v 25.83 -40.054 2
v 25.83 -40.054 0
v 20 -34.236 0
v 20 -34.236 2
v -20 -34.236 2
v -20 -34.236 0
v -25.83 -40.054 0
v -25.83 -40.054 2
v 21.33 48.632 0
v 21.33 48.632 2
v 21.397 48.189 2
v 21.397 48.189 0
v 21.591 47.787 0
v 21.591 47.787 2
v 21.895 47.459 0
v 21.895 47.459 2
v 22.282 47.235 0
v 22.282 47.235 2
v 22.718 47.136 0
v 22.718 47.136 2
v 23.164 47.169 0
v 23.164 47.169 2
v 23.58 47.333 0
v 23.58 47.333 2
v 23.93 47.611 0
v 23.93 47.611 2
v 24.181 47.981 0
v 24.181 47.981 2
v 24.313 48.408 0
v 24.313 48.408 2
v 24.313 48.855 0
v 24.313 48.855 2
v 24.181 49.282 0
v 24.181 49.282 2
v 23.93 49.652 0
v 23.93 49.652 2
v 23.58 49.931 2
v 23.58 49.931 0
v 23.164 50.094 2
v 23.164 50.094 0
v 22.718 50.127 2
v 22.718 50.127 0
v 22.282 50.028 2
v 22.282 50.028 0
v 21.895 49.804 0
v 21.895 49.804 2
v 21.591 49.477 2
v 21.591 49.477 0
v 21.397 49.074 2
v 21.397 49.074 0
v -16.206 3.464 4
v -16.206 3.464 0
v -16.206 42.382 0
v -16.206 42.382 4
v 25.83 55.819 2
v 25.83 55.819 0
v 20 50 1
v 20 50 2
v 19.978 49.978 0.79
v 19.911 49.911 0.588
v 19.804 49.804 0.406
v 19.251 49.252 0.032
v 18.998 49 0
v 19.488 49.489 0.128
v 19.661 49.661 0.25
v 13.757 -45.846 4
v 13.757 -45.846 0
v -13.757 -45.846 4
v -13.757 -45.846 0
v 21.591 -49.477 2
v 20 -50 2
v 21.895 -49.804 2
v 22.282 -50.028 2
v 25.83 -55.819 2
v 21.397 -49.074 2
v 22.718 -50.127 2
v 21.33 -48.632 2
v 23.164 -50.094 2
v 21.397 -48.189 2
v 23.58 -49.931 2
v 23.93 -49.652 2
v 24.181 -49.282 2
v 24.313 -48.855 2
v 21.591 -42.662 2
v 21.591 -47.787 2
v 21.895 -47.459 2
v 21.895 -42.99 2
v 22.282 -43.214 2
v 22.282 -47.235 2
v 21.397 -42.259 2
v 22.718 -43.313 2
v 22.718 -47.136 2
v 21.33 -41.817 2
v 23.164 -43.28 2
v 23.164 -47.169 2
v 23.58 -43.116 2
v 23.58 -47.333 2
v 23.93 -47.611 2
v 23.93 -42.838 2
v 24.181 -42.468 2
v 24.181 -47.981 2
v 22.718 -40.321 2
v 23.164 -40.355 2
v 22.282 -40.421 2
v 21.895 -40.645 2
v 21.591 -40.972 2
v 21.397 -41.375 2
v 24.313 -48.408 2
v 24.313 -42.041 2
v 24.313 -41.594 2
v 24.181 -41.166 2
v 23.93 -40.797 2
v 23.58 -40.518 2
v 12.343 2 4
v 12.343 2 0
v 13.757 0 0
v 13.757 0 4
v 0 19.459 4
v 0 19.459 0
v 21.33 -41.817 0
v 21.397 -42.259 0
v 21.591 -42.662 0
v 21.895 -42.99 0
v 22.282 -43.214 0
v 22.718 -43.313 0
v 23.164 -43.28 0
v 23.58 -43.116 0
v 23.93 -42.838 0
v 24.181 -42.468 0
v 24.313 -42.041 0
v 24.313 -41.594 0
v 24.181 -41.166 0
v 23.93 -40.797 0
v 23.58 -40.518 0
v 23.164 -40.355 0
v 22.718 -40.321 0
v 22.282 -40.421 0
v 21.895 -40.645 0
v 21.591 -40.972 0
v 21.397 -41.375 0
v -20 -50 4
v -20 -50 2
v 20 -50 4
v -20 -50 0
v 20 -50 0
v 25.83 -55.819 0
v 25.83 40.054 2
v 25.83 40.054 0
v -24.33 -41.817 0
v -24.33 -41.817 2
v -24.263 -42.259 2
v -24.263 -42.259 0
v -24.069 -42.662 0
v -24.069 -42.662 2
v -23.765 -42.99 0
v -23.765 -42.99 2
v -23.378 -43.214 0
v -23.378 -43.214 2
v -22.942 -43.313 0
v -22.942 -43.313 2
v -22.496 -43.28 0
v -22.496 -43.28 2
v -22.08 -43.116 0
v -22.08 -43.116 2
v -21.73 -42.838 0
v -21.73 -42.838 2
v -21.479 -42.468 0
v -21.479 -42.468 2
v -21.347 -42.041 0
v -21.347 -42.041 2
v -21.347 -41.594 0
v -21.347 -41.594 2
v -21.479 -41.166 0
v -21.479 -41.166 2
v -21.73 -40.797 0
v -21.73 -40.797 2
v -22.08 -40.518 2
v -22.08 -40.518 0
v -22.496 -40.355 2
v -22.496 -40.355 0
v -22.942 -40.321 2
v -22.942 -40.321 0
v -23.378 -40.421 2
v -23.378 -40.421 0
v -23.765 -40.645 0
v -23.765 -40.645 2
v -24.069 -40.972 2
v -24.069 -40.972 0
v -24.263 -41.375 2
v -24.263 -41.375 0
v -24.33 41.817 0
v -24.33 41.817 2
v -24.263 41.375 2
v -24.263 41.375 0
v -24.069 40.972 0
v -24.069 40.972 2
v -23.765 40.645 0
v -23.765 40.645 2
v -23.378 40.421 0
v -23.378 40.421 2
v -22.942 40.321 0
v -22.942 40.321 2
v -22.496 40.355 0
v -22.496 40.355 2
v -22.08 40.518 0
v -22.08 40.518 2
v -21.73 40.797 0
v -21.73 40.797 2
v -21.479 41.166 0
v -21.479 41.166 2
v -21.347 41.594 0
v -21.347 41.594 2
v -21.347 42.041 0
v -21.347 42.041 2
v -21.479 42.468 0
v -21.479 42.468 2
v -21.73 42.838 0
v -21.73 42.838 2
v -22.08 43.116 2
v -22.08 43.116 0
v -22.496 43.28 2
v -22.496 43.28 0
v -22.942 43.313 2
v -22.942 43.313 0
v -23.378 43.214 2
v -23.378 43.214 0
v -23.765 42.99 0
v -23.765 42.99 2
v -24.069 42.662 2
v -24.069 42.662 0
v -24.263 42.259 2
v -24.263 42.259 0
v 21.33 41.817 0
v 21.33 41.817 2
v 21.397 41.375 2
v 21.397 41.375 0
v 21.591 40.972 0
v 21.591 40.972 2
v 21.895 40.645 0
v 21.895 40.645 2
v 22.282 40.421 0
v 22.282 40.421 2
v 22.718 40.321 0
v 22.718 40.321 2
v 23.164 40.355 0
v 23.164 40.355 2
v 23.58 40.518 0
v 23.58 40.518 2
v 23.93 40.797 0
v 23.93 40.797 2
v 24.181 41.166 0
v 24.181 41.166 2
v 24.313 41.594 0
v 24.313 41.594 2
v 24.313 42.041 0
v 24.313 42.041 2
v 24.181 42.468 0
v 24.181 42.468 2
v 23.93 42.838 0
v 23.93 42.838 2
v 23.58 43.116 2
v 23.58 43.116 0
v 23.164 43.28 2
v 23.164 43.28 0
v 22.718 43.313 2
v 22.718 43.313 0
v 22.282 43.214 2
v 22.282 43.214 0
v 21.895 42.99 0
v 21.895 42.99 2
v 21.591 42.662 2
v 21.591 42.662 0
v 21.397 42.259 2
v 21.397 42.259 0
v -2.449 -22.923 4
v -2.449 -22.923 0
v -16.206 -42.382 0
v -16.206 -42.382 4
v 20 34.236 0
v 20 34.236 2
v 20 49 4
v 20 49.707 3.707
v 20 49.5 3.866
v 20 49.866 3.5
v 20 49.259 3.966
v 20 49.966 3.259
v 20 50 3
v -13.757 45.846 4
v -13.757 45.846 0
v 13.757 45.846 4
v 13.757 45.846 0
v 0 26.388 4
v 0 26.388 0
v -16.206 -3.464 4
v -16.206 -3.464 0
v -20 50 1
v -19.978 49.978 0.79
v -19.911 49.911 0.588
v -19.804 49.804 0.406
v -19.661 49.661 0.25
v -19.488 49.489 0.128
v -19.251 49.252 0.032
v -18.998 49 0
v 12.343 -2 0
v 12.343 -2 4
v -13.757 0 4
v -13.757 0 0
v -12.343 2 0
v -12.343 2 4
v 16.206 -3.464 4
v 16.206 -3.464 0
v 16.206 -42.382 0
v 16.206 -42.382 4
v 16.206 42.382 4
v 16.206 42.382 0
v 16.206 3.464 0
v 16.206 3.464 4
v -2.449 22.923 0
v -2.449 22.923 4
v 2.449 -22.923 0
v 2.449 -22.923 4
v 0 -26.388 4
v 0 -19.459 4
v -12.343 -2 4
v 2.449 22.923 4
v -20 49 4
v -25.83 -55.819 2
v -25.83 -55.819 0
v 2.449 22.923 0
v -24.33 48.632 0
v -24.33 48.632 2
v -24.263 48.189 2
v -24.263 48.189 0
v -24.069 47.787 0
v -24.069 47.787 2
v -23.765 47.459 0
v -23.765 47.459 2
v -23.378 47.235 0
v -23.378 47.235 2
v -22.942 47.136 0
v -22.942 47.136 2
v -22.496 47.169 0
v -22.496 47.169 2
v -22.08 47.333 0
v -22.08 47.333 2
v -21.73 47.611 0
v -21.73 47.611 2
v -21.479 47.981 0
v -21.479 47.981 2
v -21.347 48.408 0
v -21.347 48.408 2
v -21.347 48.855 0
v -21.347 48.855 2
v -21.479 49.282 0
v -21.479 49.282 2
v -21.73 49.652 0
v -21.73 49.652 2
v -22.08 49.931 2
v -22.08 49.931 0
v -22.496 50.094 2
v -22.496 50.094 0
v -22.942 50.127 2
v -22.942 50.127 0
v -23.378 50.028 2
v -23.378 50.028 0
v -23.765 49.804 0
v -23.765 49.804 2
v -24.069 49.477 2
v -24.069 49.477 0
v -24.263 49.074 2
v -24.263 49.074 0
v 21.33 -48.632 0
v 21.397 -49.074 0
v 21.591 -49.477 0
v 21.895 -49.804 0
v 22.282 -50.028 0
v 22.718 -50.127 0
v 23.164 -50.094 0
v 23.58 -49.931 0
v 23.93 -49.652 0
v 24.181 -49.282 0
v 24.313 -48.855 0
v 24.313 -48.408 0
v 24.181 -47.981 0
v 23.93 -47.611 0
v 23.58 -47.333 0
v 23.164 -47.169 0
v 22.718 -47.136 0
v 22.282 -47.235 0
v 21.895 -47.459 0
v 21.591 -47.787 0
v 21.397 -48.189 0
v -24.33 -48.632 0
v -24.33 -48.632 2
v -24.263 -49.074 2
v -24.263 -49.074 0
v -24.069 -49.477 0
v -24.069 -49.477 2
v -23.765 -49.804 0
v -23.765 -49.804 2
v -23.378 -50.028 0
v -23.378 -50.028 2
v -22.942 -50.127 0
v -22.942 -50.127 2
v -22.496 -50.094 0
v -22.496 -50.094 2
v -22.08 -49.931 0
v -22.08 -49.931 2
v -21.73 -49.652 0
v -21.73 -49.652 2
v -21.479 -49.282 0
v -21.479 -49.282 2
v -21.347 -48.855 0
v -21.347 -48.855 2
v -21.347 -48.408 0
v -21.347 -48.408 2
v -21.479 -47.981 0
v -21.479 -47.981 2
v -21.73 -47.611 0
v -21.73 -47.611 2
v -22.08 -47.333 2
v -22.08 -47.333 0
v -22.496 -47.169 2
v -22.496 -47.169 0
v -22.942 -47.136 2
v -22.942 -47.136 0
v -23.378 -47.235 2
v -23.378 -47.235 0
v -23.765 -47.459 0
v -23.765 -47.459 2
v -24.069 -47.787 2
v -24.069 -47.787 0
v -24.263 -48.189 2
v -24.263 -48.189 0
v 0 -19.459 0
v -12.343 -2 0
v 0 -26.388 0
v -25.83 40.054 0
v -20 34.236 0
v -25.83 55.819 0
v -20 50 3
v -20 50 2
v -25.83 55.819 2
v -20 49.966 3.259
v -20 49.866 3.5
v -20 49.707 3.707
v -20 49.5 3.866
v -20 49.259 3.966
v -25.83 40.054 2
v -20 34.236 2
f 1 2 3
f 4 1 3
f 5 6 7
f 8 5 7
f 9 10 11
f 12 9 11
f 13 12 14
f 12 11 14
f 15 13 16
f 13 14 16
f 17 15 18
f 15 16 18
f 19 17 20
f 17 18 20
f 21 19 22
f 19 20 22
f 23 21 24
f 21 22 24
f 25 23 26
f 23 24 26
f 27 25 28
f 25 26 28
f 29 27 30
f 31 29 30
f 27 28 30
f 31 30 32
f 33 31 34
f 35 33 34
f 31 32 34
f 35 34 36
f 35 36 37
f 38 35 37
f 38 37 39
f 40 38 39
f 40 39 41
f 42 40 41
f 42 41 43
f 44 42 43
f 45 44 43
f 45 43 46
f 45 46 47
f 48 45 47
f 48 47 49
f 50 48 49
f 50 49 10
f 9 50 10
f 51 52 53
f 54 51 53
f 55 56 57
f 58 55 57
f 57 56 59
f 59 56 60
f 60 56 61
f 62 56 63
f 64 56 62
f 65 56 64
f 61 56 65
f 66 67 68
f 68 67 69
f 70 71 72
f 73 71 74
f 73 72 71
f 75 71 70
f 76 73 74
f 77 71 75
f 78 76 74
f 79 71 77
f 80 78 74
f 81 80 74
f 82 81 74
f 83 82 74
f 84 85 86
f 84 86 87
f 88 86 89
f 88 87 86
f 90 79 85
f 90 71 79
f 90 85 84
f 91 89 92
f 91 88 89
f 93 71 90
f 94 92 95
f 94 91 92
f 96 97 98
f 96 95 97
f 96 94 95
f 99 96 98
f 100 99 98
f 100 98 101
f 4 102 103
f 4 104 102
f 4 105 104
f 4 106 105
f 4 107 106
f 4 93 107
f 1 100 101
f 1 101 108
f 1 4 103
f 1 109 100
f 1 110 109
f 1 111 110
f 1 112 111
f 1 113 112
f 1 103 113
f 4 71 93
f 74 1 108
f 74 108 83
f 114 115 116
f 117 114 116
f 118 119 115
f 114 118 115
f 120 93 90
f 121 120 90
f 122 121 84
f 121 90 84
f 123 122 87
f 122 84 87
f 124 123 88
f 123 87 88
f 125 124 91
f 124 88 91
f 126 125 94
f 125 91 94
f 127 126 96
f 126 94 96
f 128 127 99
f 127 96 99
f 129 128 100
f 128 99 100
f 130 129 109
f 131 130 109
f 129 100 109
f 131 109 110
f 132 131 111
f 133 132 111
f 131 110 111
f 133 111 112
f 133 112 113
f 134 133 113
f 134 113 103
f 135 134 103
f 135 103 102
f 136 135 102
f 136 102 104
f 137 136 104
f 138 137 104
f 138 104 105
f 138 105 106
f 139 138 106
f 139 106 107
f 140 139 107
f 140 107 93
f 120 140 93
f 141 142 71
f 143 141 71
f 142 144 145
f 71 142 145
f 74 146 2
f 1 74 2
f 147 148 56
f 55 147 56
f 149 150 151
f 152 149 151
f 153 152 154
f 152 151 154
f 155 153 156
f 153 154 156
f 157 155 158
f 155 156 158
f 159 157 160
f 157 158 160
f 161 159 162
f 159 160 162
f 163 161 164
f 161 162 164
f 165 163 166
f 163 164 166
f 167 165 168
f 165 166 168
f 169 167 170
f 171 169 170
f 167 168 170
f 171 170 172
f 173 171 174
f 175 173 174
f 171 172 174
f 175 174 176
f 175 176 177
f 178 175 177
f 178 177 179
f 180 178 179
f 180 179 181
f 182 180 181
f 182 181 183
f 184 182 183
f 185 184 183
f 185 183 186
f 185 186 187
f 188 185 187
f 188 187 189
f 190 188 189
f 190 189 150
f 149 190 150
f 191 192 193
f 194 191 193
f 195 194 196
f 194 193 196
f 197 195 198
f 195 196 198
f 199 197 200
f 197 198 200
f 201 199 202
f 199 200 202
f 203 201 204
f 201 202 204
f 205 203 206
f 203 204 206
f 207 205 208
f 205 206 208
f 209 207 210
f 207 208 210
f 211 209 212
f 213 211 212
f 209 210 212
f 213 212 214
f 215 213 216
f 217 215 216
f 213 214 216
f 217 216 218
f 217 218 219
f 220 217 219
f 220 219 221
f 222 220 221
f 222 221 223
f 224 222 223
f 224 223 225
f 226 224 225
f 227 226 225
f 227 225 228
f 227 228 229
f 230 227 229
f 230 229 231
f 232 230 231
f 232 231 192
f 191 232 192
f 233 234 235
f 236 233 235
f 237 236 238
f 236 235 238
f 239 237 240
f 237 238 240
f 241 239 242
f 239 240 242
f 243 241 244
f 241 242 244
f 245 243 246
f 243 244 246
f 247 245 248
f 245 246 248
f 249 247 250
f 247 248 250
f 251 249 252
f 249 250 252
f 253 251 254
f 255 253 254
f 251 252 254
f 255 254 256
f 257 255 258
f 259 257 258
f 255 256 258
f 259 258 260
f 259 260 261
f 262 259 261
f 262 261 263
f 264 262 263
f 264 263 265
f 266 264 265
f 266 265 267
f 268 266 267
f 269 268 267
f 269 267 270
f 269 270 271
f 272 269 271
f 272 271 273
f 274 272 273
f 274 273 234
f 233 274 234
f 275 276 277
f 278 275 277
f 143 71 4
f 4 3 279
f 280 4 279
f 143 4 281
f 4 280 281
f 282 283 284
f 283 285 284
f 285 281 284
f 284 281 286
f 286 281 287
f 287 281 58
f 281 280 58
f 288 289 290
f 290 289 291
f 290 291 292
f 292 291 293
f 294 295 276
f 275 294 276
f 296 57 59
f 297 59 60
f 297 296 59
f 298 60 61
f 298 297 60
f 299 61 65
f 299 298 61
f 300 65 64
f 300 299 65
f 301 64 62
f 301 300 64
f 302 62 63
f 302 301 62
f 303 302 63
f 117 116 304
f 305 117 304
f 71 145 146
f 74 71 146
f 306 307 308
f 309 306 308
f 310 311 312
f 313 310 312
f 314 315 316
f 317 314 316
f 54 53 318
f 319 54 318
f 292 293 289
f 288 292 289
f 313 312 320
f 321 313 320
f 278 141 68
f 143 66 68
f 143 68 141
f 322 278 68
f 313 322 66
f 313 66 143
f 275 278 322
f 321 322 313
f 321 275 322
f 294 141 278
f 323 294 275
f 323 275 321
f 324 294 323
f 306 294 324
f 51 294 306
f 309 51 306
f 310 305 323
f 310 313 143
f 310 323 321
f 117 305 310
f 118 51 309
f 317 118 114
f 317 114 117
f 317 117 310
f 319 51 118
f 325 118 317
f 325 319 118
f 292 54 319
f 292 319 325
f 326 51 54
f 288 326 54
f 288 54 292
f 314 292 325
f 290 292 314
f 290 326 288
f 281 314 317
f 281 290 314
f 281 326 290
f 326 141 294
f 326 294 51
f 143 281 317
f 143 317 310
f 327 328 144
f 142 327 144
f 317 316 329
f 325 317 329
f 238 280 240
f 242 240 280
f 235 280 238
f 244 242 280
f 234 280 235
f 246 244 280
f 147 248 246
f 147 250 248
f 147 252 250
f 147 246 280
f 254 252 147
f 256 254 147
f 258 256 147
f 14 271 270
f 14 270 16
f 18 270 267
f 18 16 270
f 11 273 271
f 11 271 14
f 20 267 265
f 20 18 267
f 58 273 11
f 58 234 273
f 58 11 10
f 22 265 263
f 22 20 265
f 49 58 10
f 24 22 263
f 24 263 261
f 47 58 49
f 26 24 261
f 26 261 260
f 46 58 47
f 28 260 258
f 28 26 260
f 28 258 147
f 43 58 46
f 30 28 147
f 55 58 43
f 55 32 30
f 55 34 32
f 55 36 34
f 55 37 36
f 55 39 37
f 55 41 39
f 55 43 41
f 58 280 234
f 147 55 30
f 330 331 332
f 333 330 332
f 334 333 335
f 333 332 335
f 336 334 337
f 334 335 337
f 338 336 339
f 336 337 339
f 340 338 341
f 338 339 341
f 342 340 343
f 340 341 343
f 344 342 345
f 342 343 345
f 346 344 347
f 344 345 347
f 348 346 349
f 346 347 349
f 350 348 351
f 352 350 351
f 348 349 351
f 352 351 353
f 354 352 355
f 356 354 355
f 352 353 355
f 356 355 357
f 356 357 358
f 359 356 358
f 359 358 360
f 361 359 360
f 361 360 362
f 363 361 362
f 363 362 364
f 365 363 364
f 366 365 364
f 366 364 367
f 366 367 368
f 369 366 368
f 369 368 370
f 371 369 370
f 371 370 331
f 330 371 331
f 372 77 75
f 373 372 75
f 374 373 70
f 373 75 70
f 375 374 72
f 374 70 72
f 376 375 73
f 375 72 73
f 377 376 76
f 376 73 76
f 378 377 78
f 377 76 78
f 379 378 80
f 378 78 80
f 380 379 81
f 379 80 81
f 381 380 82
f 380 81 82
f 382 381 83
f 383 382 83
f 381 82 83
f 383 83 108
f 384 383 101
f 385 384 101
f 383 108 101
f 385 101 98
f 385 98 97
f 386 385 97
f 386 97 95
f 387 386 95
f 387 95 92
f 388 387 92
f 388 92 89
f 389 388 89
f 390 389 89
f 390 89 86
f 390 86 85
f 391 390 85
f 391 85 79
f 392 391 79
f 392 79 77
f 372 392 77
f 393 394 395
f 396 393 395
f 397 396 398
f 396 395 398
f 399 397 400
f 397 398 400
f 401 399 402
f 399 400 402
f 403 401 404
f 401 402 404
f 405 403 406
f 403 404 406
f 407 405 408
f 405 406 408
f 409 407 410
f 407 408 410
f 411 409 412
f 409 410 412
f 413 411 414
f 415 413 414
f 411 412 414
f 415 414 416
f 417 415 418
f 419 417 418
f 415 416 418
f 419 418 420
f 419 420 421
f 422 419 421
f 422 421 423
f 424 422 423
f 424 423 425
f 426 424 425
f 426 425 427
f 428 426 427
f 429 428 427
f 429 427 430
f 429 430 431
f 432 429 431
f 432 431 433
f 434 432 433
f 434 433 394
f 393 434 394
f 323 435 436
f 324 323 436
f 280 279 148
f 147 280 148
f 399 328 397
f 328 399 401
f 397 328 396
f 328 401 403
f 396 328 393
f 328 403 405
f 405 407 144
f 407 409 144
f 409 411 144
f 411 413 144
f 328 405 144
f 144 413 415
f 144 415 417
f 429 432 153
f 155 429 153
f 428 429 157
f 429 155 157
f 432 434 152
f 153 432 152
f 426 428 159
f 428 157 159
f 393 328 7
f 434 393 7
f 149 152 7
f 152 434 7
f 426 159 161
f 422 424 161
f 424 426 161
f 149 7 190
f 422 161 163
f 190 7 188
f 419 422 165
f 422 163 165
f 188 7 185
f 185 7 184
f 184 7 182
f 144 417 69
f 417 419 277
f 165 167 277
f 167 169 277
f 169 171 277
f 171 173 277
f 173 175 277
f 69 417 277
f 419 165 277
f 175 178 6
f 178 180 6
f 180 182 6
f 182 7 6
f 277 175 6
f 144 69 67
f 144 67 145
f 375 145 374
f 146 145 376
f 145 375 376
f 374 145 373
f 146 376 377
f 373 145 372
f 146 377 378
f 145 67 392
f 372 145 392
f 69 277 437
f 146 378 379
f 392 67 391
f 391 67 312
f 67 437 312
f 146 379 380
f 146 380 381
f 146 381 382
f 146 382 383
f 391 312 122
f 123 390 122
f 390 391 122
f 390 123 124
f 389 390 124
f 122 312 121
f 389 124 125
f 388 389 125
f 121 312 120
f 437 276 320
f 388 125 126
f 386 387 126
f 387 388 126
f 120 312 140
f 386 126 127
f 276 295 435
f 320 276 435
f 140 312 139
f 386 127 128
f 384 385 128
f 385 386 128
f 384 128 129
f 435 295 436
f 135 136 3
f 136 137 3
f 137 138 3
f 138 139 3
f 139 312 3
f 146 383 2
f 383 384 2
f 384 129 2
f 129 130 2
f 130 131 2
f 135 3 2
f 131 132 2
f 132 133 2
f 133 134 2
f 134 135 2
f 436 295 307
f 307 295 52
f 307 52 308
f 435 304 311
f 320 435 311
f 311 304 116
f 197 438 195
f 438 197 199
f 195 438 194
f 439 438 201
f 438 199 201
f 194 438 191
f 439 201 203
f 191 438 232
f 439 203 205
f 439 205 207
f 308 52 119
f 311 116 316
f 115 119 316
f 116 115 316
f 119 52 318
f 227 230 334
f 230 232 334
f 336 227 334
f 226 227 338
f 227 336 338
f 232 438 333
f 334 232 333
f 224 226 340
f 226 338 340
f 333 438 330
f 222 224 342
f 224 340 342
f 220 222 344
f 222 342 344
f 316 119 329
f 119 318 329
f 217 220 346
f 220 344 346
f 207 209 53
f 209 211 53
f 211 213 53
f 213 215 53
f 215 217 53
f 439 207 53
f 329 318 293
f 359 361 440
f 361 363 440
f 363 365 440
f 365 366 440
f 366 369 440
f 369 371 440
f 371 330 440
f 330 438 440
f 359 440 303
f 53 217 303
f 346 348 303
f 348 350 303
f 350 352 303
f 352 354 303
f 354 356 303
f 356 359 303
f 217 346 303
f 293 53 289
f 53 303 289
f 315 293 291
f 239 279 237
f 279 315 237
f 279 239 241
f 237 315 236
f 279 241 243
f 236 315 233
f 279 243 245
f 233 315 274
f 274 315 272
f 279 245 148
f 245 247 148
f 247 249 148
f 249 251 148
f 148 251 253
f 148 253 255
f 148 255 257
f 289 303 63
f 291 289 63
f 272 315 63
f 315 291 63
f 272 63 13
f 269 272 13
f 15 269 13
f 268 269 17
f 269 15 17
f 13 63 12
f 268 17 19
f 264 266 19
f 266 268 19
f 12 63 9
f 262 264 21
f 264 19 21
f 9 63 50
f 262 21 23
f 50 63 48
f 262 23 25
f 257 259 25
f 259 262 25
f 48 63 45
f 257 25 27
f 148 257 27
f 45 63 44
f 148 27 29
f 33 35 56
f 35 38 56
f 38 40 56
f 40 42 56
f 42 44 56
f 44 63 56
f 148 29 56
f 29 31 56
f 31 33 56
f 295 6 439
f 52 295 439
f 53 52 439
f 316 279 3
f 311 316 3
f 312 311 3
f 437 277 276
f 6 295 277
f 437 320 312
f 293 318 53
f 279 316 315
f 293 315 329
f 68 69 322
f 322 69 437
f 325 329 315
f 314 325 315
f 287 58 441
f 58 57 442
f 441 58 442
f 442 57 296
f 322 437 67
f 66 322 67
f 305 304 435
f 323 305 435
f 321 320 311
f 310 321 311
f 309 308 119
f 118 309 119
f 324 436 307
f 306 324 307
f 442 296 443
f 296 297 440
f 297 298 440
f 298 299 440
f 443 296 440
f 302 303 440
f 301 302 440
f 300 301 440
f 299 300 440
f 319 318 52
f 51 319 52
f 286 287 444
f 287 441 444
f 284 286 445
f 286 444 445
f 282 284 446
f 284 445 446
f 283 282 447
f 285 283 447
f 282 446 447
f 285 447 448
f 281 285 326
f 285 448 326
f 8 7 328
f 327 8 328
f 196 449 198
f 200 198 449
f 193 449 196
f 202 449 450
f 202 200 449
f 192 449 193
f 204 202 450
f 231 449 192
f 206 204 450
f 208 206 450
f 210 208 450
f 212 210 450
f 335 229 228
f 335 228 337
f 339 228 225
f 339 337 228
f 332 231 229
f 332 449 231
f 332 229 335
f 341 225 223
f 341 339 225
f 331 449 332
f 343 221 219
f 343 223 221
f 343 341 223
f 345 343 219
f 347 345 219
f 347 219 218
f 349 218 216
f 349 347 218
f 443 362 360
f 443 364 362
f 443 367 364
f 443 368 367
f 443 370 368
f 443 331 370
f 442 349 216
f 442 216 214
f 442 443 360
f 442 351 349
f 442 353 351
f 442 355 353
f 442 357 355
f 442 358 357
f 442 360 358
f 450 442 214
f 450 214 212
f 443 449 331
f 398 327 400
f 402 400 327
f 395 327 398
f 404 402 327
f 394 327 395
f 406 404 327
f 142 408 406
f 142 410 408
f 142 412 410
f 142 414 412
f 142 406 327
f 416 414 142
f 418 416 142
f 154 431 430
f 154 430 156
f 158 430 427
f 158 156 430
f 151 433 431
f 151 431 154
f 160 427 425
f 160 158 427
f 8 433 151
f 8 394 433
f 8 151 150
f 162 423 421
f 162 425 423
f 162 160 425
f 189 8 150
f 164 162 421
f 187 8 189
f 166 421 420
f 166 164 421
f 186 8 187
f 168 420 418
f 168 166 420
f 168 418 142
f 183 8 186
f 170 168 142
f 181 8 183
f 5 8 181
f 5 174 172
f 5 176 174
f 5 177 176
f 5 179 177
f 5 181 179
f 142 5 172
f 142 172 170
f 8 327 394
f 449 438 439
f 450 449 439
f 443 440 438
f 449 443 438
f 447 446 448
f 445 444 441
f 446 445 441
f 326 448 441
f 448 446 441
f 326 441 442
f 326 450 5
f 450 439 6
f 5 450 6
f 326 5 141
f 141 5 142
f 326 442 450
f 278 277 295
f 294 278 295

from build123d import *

# Parameters (mm, degrees)
F1_DEPTH = 4
F2_DEPTH = 2
F3_D     = 3
F4_R     = 1


with BuildPart() as f1:
    # F0 (on Top) → F1 (new body)
    with BuildSketch(Plane.XY):
        Polygon((20, 34.2358313501), (20, 50), (-20, 50), (-20, 34.2358313501), (-20, -34.2358313501), (-20, -50), (20, -50), (20, -34.2358313501), align=None)
        Polygon((16.206420958, -42.3818695248), (16.206420958, -45.8463579416), (13.757067936, -45.8463579416), (-13.757067936, -45.8463579416), (-16.206420958, -45.8463579416), (-16.206420958, -42.3818695248), (-16.206420958, -3.4644884169), (-16.206420958, -2), (-16.206420958, 0), (-16.206420958, 2), (-16.206420958, 3.4644884169), (-16.206420958, 42.3818695248), (-16.206420958, 45.8463579416), (-13.757067936, 45.8463579416), (13.757067936, 45.8463579416), (16.206420958, 45.8463579416), (16.206420958, 42.3818695248), (16.206420958, 3.4644884169), (16.206420958, 2), (16.206420958, 0), (16.206420958, -2), (16.206420958, -3.4644884169), align=None, mode=Mode.SUBTRACT)
        Polygon((1.224676511, 24.6554231792), (16.206420958, 45.8463579416), (13.757067936, 45.8463579416), (0, 26.3876673877), align=None)
        Polygon((2.4493530221, 22.9231789708), (16.206420958, 42.3818695248), (16.206420958, 45.8463579416), (1.224676511, 24.6554231792), align=None)
        Polygon((-2.4493530221, 22.9231789708), (-1.224676511, 24.6554231792), (-16.206420958, 45.8463579416), (-16.206420958, 42.3818695248), align=None)
        Polygon((-16.206420958, 45.8463579416), (-1.224676511, 24.6554231792), (0, 26.3876673877), (-13.757067936, 45.8463579416), align=None)
        Polygon((-16.206420958, -42.3818695248), (-16.206420958, -45.8463579416), (-1.224676511, -24.6554231792), (-2.4493530221, -22.9231789708), align=None)
        Polygon((-16.206420958, -45.8463579416), (-13.757067936, -45.8463579416), (0, -26.3876673877), (-1.224676511, -24.6554231792), align=None)
        Polygon((1.224676511, -24.6554231792), (16.206420958, -45.8463579416), (16.206420958, -42.3818695248), (2.4493530221, -22.9231789708), align=None)
        Polygon((13.757067936, -45.8463579416), (16.206420958, -45.8463579416), (1.224676511, -24.6554231792), (0, -26.3876673877), align=None)
        Polygon((14.7924442161, 2), (16.206420958, 2), (16.206420958, 3.4644884169), (2.4493530221, 22.9231789708), (1.224676511, 21.1909347624), align=None)
        Polygon((-16.206420958, 3.4644884169), (-16.206420958, 2), (-14.7924442161, 2), (-1.224676511, 21.1909347624), (-2.4493530221, 22.9231789708), align=None)
        Polygon((-2.4493530221, -22.9231789708), (-1.224676511, -21.1909347624), (-14.7924442161, -2), (-16.206420958, -2), (-16.206420958, -3.4644884169), align=None)
        Polygon((2.4493530221, -22.9231789708), (16.206420958, -3.4644884169), (16.206420958, -2), (14.7924442161, -2), (1.224676511, -21.1909347624), align=None)
        Polygon((12.343091194, 2), (14.7924442161, 2), (1.224676511, 21.1909347624), (0, 19.458690554), align=None)
        Polygon((-1.224676511, 21.1909347624), (-14.7924442161, 2), (-12.343091194, 2), (0, 19.458690554), align=None)
        Polygon((-14.7924442161, -2), (-1.224676511, -21.1909347624), (0, -19.458690554), (-12.343091194, -2), align=None)
        Polygon((0, -19.458690554), (1.224676511, -21.1909347624), (14.7924442161, -2), (12.343091194, -2), align=None)
        Polygon((14.7924442161, -2), (16.206420958, 0), (13.757067936, 0), (12.343091194, -2), align=None)
        Polygon((13.757067936, 0), (16.206420958, 0), (14.7924442161, 2), (12.343091194, 2), align=None)
        Polygon((-16.206420958, 0), (-14.7924442161, -2), (-12.343091194, -2), (-13.757067936, 0), align=None)
        Polygon((-14.7924442161, 2), (-16.206420958, 0), (-13.757067936, 0), (-12.343091194, 2), align=None)
        Polygon((0, 22.9231789708), (1.224676511, 21.1909347624), (2.4493530221, 22.9231789708), (1.224676511, 24.6554231792), align=None)
        Polygon((-1.224676511, 24.6554231792), (0, 22.9231789708), (1.224676511, 24.6554231792), (0, 26.3876673877), align=None)
        Polygon((-1.224676511, 21.1909347624), (0, 22.9231789708), (-1.224676511, 24.6554231792), (-2.4493530221, 22.9231789708), align=None)
        Polygon((0, 19.458690554), (1.224676511, 21.1909347624), (0, 22.9231789708), (-1.224676511, 21.1909347624), align=None)
        Polygon((-1.224676511, -21.1909347624), (0, -22.9231789708), (1.224676511, -21.1909347624), (0, -19.458690554), align=None)
        Polygon((0, -22.9231789708), (1.224676511, -24.6554231792), (2.4493530221, -22.9231789708), (1.224676511, -21.1909347624), align=None)
        Polygon((0, -26.3876673877), (1.224676511, -24.6554231792), (0, -22.9231789708), (-1.224676511, -24.6554231792), align=None)
        Polygon((-1.224676511, -24.6554231792), (0, -22.9231789708), (-1.224676511, -21.1909347624), (-2.4493530221, -22.9231789708), align=None)
        Polygon((14.7924442161, -2), (16.206420958, -2), (16.206420958, 0), align=None)
        Polygon((14.7924442161, 2), (16.206420958, 0), (16.206420958, 2), align=None)
        Polygon((-16.206420958, 2), (-16.206420958, 0), (-14.7924442161, 2), align=None)
        Polygon((-16.206420958, -2), (-14.7924442161, -2), (-16.206420958, 0), align=None)
    extrude(amount=F1_DEPTH)

    # F0 (on Top) → F2 (join)
    with BuildSketch(Plane.XY):
        Polygon((25.830000639, 55.8186091483), (20, 50), (20, 34.2358313501), (25.830000639, 40.0544404984), align=None)
        Polygon((-20, 34.2358313501), (-20, 50), (-25.830000639, 55.8186091483), (-25.830000639, 40.0544404984), align=None)
        Polygon((-20, -50), (-20, -34.2358313501), (-25.830000639, -40.0544404984), (-25.830000639, -55.8186091483), align=None)
        Polygon((25.830000639, -40.0544404984), (20, -34.2358313501), (20, -50), (25.830000639, -55.8186091483), align=None)
    extrude(amount=F2_DEPTH)

    # F3 (through all)
    with Locations(Plane(origin=(0, 0, 0), x_dir=(1, 0, 0), z_dir=(0, 0, -1))):
        with Locations((22.830000639, -48.6315488815), (22.830000639, -41.8172627687), (-22.830000639, -48.6315488815), (-22.830000639, -41.8172627687), (-22.830000639, 41.8172627687), (-22.830000639, 48.6315488815), (22.830000639, 41.8172627687), (22.830000639, 48.6315488815)):
            Hole(F3_D / 2)

    # F4
    f4_edges = [f1.edges().sort_by_distance(p)[0] for p in [
        (0, 50, 4),
        (0, 50, 0),
    ]]
    fillet(f4_edges, radius=F4_R)


solid = f1.part
